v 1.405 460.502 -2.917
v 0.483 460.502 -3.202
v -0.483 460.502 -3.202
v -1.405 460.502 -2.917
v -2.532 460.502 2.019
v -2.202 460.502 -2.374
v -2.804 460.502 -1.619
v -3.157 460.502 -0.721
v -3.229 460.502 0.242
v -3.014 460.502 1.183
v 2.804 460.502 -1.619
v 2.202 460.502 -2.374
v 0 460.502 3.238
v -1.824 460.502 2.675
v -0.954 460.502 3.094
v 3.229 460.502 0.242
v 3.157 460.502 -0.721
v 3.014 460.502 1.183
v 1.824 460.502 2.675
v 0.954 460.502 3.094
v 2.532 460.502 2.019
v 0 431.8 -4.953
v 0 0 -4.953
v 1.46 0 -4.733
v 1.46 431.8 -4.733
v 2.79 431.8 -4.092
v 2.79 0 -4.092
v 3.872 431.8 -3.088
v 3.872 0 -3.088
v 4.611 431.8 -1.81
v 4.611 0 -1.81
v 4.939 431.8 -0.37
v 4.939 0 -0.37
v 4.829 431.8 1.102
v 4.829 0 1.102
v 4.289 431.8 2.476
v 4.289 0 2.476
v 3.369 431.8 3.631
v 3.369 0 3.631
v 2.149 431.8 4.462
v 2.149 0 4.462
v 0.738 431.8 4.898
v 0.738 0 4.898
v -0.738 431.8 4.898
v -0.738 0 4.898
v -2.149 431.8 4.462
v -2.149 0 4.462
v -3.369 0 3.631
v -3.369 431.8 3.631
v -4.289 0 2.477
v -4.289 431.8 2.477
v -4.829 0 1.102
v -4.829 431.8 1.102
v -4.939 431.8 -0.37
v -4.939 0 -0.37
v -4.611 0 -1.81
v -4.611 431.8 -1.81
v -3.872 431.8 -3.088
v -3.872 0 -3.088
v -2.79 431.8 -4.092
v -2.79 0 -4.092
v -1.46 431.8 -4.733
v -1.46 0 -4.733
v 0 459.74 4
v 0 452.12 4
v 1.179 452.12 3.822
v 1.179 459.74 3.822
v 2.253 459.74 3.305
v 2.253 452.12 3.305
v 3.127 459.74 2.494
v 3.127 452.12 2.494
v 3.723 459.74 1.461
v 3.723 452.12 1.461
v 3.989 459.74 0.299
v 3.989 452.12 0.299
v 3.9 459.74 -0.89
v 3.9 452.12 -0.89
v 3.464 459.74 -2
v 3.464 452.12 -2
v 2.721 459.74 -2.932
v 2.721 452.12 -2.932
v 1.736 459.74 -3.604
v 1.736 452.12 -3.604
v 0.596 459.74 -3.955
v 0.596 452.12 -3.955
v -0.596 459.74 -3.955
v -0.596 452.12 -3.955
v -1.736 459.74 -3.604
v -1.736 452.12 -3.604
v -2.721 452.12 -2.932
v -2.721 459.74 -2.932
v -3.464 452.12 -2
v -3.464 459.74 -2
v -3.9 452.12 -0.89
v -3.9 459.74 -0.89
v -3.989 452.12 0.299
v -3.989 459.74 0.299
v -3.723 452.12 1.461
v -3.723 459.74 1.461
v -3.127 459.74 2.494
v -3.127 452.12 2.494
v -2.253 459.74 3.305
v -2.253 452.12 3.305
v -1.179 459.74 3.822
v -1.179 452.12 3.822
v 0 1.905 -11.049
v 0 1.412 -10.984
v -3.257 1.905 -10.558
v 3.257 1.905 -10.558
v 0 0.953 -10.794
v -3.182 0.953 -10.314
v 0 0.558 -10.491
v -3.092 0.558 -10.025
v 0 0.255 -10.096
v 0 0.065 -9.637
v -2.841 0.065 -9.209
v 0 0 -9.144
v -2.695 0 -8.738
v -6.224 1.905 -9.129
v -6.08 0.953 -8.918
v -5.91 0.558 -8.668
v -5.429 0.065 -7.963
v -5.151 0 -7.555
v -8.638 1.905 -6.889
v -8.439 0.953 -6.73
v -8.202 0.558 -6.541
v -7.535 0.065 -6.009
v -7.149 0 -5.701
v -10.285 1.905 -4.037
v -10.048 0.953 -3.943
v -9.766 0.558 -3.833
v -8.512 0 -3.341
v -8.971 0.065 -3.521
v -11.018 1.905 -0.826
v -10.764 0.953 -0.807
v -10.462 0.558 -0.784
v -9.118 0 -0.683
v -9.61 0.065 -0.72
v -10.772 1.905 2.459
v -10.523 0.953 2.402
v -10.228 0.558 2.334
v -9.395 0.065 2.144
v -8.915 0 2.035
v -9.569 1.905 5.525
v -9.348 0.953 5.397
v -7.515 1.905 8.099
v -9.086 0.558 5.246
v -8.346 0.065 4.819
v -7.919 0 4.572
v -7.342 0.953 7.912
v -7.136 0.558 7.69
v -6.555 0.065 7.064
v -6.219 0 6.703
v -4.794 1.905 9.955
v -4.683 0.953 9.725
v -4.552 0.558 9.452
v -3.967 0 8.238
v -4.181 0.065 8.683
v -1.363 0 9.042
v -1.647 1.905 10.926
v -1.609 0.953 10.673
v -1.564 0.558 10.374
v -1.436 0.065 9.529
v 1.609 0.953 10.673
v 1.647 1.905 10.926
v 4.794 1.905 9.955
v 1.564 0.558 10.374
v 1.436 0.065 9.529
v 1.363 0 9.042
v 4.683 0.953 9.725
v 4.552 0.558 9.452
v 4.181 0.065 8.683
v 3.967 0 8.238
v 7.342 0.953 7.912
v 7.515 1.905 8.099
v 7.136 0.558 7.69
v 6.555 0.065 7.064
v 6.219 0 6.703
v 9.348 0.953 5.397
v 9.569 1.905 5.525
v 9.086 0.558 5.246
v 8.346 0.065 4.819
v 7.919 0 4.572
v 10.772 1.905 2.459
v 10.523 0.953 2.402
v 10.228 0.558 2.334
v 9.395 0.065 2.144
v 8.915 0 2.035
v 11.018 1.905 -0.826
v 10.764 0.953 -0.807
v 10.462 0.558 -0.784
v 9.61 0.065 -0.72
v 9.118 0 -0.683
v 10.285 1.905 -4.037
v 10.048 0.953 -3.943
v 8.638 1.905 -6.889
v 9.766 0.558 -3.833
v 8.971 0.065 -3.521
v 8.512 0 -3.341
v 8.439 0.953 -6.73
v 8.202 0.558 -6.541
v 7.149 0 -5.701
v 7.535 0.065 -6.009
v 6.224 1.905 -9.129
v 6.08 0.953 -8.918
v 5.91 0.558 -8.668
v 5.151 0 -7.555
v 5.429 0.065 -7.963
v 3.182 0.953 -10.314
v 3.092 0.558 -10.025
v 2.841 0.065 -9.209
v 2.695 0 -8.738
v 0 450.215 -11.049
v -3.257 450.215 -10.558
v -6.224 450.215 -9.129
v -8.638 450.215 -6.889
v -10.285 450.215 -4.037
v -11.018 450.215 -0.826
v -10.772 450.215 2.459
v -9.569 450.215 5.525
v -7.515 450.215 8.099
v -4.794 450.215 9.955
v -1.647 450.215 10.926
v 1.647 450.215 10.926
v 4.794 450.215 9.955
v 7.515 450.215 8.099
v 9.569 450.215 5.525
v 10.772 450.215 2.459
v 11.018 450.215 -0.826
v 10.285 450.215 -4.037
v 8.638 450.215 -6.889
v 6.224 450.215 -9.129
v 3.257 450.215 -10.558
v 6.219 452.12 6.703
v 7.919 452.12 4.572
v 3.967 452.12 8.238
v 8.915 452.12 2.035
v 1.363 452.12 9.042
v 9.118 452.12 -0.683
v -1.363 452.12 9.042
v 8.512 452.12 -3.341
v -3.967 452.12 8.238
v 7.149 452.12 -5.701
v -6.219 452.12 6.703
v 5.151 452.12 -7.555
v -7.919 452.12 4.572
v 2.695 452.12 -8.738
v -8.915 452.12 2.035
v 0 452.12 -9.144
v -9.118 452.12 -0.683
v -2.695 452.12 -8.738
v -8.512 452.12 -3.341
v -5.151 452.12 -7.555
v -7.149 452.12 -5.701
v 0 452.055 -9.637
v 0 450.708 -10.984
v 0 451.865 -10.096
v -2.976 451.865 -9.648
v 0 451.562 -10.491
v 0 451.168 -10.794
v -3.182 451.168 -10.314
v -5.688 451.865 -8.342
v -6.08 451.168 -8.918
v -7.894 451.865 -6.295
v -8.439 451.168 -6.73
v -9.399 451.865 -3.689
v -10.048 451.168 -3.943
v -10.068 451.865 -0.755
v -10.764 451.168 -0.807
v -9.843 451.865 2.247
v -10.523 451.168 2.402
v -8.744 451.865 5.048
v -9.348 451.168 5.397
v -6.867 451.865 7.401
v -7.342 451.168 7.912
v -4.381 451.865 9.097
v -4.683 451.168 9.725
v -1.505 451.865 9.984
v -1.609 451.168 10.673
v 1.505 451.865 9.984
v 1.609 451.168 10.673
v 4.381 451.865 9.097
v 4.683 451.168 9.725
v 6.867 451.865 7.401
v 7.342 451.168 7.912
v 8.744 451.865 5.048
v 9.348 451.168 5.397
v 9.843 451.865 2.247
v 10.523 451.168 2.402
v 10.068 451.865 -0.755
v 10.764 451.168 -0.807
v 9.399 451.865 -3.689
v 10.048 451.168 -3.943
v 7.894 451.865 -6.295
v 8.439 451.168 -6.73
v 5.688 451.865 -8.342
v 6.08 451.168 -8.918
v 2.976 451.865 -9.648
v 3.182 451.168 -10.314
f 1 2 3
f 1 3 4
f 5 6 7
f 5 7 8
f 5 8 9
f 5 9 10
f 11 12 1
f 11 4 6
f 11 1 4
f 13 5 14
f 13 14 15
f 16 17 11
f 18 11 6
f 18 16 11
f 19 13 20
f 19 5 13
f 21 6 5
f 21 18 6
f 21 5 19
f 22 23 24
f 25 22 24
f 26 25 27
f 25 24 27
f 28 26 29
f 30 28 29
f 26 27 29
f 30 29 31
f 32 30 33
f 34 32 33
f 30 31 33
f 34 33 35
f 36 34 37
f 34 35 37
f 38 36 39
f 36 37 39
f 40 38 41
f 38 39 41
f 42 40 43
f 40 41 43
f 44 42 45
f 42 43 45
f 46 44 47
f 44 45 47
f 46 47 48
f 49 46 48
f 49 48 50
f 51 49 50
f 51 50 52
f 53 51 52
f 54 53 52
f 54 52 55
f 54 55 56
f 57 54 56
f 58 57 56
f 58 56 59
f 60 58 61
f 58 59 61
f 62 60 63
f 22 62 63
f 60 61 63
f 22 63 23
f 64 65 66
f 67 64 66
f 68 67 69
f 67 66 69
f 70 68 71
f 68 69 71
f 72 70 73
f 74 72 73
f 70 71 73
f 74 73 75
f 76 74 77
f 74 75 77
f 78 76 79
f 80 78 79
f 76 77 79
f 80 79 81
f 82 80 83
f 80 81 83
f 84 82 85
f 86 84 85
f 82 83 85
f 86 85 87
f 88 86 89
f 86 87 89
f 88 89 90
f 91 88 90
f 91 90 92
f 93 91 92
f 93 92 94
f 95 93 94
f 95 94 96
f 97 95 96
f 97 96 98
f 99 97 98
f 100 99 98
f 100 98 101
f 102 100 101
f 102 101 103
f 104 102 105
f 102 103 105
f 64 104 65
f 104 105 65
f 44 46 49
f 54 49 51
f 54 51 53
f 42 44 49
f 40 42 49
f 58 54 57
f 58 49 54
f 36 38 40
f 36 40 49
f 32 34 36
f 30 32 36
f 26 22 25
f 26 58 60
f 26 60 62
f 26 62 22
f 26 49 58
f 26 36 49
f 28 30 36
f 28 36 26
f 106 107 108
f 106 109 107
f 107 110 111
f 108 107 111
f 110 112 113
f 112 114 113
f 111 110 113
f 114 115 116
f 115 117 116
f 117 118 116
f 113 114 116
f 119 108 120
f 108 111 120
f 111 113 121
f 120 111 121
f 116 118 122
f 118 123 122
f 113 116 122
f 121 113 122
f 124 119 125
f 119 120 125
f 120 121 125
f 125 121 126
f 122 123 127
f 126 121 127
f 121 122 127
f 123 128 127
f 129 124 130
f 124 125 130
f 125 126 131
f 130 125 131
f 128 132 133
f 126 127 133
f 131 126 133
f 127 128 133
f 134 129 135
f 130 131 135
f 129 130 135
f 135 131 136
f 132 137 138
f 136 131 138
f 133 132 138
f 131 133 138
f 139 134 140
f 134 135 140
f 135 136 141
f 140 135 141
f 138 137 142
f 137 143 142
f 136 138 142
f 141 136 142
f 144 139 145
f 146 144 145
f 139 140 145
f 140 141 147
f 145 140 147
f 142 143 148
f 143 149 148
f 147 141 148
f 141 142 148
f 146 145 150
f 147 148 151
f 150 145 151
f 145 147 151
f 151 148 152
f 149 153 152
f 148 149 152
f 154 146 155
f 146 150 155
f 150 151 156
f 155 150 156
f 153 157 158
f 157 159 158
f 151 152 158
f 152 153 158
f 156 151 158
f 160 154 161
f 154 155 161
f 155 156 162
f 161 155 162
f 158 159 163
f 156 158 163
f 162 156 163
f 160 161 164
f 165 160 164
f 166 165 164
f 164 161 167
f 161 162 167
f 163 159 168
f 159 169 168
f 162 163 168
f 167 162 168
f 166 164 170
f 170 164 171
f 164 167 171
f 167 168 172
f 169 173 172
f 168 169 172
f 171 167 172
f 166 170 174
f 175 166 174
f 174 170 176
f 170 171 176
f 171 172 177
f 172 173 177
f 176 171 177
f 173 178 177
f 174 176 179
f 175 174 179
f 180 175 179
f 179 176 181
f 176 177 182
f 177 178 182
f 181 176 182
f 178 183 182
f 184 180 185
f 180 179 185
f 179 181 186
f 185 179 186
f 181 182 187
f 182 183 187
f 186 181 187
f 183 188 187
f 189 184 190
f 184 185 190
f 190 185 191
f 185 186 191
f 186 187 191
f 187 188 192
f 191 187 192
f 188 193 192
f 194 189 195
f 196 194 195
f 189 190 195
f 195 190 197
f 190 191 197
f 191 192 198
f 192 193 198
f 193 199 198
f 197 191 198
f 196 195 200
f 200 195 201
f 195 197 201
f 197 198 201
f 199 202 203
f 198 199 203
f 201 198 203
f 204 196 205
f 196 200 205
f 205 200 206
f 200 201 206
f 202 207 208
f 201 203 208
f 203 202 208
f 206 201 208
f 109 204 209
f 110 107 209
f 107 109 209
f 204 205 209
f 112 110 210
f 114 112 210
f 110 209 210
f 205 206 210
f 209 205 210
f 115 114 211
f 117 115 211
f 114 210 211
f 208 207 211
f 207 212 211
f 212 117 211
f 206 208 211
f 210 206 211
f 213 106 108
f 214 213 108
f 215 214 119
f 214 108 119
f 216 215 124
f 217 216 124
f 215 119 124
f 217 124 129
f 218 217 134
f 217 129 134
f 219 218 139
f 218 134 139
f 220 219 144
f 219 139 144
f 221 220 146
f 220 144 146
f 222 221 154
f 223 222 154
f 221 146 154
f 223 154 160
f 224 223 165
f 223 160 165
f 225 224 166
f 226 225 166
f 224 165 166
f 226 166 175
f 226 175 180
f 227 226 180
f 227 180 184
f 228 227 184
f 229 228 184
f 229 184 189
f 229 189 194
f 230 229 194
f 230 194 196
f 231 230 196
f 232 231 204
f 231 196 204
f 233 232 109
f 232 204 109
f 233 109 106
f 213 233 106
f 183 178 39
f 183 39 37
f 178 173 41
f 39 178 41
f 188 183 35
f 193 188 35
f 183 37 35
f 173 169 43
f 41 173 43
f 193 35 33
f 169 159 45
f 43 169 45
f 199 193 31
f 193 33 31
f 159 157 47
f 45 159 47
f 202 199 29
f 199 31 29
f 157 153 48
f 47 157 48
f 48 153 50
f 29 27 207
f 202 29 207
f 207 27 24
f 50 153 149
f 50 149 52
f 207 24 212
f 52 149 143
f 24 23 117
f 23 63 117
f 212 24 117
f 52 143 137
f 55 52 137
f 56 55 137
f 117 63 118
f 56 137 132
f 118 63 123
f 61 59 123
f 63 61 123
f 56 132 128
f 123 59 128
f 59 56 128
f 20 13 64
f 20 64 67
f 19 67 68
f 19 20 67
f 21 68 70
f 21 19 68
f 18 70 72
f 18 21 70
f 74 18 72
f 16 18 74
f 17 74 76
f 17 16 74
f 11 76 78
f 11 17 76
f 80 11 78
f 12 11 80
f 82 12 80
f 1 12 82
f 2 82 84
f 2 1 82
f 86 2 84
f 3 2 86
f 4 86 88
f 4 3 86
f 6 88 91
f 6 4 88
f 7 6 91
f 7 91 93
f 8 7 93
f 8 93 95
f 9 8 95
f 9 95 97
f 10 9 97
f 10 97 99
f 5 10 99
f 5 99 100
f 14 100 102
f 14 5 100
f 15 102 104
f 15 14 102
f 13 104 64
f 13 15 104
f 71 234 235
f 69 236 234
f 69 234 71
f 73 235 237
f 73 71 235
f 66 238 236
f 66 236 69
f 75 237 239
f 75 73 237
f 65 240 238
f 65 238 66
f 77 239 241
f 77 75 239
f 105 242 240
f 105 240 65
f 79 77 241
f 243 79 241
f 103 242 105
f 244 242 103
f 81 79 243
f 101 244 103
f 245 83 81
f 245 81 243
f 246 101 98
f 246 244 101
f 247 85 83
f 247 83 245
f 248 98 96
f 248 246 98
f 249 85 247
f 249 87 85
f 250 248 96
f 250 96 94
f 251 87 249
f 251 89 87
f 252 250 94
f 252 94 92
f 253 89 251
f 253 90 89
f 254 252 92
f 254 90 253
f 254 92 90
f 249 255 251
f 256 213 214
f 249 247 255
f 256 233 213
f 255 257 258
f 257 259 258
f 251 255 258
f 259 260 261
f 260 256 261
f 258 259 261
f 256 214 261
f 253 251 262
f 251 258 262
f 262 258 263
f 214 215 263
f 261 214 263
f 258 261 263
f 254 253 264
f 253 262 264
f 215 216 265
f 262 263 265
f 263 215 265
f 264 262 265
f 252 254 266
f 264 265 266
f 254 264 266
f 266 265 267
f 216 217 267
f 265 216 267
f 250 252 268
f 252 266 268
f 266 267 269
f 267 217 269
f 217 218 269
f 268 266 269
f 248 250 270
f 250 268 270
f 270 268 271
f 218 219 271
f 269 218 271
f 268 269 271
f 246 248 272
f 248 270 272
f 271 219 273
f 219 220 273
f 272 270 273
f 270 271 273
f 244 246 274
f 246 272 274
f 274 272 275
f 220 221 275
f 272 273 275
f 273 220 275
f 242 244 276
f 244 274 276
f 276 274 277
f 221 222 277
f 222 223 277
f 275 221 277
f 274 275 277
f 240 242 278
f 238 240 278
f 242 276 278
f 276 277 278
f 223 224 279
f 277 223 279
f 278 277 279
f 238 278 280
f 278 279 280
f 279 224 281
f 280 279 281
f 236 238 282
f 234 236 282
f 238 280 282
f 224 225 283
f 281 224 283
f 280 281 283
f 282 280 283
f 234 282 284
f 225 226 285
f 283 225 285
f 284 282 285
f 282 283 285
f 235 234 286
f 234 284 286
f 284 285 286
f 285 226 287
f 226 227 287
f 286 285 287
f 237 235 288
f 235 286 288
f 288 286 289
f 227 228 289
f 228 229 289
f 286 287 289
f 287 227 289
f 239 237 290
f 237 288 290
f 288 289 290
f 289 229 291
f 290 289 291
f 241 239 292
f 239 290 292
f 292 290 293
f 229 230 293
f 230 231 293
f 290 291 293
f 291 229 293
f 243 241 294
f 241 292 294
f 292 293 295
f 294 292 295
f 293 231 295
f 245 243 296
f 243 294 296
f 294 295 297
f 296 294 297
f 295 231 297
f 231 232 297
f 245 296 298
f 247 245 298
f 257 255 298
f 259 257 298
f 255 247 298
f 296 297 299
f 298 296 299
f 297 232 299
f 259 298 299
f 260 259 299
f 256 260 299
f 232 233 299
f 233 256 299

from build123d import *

# Parameters (mm, degrees)
SKETCH1_R           = 11.049
BOSS_EXTRUDE1_DEPTH = 452.12
SKETCH2_R           = 4
BOSS_EXTRUDE2_DEPTH = 8.382
CHAMFER1_SIZE       = 0.762
FILLET1_R           = 1.905
SKETCH3_R           = 4.953
CUT_EXTRUDE1_DEPTH  = 431.8


with BuildPart() as part:
    # Sketch1 → Boss-Extrude1 (new body)
    with BuildSketch(Plane(origin=(0, 0, 0), x_dir=(1, 0, 0), z_dir=(0, 1, 0))):
        with Locations(Location((0, 0, 0), (0, 0, 90))):
            Circle(SKETCH1_R)
    extrude(amount=BOSS_EXTRUDE1_DEPTH)

    # Sketch2 → Boss-Extrude2 (add)
    with BuildSketch(Plane(origin=(0, 452.12, 0), x_dir=(1, 0, 0), z_dir=(0, 1, 0))):
        with Locations(Location((0, 0, 0), (0, 0, 270))):
            Circle(SKETCH2_R)
    extrude(amount=BOSS_EXTRUDE2_DEPTH)

    # Chamfer1
    chamfer1_edges = [part.edges().sort_by_distance(p)[0] for p in [
        (0, 460.502, -4),
    ]]
    chamfer(chamfer1_edges, length=CHAMFER1_SIZE)

    # Fillet1
    fillet1_edges = [part.edges().sort_by_distance(p)[0] for p in [
        (0, 0, 11.049),
        (0, 452.12, 11.049),
    ]]
    fillet(fillet1_edges, radius=FILLET1_R)

    # Sketch3 → Cut-Extrude1 (cut)
    with BuildSketch(Plane.XZ):
        with Locations(Location((0, 0, 0), (0, 0, 270))):
            Circle(SKETCH3_R)
    extrude(amount=-CUT_EXTRUDE1_DEPTH, mode=Mode.SUBTRACT)


solid = part.part
